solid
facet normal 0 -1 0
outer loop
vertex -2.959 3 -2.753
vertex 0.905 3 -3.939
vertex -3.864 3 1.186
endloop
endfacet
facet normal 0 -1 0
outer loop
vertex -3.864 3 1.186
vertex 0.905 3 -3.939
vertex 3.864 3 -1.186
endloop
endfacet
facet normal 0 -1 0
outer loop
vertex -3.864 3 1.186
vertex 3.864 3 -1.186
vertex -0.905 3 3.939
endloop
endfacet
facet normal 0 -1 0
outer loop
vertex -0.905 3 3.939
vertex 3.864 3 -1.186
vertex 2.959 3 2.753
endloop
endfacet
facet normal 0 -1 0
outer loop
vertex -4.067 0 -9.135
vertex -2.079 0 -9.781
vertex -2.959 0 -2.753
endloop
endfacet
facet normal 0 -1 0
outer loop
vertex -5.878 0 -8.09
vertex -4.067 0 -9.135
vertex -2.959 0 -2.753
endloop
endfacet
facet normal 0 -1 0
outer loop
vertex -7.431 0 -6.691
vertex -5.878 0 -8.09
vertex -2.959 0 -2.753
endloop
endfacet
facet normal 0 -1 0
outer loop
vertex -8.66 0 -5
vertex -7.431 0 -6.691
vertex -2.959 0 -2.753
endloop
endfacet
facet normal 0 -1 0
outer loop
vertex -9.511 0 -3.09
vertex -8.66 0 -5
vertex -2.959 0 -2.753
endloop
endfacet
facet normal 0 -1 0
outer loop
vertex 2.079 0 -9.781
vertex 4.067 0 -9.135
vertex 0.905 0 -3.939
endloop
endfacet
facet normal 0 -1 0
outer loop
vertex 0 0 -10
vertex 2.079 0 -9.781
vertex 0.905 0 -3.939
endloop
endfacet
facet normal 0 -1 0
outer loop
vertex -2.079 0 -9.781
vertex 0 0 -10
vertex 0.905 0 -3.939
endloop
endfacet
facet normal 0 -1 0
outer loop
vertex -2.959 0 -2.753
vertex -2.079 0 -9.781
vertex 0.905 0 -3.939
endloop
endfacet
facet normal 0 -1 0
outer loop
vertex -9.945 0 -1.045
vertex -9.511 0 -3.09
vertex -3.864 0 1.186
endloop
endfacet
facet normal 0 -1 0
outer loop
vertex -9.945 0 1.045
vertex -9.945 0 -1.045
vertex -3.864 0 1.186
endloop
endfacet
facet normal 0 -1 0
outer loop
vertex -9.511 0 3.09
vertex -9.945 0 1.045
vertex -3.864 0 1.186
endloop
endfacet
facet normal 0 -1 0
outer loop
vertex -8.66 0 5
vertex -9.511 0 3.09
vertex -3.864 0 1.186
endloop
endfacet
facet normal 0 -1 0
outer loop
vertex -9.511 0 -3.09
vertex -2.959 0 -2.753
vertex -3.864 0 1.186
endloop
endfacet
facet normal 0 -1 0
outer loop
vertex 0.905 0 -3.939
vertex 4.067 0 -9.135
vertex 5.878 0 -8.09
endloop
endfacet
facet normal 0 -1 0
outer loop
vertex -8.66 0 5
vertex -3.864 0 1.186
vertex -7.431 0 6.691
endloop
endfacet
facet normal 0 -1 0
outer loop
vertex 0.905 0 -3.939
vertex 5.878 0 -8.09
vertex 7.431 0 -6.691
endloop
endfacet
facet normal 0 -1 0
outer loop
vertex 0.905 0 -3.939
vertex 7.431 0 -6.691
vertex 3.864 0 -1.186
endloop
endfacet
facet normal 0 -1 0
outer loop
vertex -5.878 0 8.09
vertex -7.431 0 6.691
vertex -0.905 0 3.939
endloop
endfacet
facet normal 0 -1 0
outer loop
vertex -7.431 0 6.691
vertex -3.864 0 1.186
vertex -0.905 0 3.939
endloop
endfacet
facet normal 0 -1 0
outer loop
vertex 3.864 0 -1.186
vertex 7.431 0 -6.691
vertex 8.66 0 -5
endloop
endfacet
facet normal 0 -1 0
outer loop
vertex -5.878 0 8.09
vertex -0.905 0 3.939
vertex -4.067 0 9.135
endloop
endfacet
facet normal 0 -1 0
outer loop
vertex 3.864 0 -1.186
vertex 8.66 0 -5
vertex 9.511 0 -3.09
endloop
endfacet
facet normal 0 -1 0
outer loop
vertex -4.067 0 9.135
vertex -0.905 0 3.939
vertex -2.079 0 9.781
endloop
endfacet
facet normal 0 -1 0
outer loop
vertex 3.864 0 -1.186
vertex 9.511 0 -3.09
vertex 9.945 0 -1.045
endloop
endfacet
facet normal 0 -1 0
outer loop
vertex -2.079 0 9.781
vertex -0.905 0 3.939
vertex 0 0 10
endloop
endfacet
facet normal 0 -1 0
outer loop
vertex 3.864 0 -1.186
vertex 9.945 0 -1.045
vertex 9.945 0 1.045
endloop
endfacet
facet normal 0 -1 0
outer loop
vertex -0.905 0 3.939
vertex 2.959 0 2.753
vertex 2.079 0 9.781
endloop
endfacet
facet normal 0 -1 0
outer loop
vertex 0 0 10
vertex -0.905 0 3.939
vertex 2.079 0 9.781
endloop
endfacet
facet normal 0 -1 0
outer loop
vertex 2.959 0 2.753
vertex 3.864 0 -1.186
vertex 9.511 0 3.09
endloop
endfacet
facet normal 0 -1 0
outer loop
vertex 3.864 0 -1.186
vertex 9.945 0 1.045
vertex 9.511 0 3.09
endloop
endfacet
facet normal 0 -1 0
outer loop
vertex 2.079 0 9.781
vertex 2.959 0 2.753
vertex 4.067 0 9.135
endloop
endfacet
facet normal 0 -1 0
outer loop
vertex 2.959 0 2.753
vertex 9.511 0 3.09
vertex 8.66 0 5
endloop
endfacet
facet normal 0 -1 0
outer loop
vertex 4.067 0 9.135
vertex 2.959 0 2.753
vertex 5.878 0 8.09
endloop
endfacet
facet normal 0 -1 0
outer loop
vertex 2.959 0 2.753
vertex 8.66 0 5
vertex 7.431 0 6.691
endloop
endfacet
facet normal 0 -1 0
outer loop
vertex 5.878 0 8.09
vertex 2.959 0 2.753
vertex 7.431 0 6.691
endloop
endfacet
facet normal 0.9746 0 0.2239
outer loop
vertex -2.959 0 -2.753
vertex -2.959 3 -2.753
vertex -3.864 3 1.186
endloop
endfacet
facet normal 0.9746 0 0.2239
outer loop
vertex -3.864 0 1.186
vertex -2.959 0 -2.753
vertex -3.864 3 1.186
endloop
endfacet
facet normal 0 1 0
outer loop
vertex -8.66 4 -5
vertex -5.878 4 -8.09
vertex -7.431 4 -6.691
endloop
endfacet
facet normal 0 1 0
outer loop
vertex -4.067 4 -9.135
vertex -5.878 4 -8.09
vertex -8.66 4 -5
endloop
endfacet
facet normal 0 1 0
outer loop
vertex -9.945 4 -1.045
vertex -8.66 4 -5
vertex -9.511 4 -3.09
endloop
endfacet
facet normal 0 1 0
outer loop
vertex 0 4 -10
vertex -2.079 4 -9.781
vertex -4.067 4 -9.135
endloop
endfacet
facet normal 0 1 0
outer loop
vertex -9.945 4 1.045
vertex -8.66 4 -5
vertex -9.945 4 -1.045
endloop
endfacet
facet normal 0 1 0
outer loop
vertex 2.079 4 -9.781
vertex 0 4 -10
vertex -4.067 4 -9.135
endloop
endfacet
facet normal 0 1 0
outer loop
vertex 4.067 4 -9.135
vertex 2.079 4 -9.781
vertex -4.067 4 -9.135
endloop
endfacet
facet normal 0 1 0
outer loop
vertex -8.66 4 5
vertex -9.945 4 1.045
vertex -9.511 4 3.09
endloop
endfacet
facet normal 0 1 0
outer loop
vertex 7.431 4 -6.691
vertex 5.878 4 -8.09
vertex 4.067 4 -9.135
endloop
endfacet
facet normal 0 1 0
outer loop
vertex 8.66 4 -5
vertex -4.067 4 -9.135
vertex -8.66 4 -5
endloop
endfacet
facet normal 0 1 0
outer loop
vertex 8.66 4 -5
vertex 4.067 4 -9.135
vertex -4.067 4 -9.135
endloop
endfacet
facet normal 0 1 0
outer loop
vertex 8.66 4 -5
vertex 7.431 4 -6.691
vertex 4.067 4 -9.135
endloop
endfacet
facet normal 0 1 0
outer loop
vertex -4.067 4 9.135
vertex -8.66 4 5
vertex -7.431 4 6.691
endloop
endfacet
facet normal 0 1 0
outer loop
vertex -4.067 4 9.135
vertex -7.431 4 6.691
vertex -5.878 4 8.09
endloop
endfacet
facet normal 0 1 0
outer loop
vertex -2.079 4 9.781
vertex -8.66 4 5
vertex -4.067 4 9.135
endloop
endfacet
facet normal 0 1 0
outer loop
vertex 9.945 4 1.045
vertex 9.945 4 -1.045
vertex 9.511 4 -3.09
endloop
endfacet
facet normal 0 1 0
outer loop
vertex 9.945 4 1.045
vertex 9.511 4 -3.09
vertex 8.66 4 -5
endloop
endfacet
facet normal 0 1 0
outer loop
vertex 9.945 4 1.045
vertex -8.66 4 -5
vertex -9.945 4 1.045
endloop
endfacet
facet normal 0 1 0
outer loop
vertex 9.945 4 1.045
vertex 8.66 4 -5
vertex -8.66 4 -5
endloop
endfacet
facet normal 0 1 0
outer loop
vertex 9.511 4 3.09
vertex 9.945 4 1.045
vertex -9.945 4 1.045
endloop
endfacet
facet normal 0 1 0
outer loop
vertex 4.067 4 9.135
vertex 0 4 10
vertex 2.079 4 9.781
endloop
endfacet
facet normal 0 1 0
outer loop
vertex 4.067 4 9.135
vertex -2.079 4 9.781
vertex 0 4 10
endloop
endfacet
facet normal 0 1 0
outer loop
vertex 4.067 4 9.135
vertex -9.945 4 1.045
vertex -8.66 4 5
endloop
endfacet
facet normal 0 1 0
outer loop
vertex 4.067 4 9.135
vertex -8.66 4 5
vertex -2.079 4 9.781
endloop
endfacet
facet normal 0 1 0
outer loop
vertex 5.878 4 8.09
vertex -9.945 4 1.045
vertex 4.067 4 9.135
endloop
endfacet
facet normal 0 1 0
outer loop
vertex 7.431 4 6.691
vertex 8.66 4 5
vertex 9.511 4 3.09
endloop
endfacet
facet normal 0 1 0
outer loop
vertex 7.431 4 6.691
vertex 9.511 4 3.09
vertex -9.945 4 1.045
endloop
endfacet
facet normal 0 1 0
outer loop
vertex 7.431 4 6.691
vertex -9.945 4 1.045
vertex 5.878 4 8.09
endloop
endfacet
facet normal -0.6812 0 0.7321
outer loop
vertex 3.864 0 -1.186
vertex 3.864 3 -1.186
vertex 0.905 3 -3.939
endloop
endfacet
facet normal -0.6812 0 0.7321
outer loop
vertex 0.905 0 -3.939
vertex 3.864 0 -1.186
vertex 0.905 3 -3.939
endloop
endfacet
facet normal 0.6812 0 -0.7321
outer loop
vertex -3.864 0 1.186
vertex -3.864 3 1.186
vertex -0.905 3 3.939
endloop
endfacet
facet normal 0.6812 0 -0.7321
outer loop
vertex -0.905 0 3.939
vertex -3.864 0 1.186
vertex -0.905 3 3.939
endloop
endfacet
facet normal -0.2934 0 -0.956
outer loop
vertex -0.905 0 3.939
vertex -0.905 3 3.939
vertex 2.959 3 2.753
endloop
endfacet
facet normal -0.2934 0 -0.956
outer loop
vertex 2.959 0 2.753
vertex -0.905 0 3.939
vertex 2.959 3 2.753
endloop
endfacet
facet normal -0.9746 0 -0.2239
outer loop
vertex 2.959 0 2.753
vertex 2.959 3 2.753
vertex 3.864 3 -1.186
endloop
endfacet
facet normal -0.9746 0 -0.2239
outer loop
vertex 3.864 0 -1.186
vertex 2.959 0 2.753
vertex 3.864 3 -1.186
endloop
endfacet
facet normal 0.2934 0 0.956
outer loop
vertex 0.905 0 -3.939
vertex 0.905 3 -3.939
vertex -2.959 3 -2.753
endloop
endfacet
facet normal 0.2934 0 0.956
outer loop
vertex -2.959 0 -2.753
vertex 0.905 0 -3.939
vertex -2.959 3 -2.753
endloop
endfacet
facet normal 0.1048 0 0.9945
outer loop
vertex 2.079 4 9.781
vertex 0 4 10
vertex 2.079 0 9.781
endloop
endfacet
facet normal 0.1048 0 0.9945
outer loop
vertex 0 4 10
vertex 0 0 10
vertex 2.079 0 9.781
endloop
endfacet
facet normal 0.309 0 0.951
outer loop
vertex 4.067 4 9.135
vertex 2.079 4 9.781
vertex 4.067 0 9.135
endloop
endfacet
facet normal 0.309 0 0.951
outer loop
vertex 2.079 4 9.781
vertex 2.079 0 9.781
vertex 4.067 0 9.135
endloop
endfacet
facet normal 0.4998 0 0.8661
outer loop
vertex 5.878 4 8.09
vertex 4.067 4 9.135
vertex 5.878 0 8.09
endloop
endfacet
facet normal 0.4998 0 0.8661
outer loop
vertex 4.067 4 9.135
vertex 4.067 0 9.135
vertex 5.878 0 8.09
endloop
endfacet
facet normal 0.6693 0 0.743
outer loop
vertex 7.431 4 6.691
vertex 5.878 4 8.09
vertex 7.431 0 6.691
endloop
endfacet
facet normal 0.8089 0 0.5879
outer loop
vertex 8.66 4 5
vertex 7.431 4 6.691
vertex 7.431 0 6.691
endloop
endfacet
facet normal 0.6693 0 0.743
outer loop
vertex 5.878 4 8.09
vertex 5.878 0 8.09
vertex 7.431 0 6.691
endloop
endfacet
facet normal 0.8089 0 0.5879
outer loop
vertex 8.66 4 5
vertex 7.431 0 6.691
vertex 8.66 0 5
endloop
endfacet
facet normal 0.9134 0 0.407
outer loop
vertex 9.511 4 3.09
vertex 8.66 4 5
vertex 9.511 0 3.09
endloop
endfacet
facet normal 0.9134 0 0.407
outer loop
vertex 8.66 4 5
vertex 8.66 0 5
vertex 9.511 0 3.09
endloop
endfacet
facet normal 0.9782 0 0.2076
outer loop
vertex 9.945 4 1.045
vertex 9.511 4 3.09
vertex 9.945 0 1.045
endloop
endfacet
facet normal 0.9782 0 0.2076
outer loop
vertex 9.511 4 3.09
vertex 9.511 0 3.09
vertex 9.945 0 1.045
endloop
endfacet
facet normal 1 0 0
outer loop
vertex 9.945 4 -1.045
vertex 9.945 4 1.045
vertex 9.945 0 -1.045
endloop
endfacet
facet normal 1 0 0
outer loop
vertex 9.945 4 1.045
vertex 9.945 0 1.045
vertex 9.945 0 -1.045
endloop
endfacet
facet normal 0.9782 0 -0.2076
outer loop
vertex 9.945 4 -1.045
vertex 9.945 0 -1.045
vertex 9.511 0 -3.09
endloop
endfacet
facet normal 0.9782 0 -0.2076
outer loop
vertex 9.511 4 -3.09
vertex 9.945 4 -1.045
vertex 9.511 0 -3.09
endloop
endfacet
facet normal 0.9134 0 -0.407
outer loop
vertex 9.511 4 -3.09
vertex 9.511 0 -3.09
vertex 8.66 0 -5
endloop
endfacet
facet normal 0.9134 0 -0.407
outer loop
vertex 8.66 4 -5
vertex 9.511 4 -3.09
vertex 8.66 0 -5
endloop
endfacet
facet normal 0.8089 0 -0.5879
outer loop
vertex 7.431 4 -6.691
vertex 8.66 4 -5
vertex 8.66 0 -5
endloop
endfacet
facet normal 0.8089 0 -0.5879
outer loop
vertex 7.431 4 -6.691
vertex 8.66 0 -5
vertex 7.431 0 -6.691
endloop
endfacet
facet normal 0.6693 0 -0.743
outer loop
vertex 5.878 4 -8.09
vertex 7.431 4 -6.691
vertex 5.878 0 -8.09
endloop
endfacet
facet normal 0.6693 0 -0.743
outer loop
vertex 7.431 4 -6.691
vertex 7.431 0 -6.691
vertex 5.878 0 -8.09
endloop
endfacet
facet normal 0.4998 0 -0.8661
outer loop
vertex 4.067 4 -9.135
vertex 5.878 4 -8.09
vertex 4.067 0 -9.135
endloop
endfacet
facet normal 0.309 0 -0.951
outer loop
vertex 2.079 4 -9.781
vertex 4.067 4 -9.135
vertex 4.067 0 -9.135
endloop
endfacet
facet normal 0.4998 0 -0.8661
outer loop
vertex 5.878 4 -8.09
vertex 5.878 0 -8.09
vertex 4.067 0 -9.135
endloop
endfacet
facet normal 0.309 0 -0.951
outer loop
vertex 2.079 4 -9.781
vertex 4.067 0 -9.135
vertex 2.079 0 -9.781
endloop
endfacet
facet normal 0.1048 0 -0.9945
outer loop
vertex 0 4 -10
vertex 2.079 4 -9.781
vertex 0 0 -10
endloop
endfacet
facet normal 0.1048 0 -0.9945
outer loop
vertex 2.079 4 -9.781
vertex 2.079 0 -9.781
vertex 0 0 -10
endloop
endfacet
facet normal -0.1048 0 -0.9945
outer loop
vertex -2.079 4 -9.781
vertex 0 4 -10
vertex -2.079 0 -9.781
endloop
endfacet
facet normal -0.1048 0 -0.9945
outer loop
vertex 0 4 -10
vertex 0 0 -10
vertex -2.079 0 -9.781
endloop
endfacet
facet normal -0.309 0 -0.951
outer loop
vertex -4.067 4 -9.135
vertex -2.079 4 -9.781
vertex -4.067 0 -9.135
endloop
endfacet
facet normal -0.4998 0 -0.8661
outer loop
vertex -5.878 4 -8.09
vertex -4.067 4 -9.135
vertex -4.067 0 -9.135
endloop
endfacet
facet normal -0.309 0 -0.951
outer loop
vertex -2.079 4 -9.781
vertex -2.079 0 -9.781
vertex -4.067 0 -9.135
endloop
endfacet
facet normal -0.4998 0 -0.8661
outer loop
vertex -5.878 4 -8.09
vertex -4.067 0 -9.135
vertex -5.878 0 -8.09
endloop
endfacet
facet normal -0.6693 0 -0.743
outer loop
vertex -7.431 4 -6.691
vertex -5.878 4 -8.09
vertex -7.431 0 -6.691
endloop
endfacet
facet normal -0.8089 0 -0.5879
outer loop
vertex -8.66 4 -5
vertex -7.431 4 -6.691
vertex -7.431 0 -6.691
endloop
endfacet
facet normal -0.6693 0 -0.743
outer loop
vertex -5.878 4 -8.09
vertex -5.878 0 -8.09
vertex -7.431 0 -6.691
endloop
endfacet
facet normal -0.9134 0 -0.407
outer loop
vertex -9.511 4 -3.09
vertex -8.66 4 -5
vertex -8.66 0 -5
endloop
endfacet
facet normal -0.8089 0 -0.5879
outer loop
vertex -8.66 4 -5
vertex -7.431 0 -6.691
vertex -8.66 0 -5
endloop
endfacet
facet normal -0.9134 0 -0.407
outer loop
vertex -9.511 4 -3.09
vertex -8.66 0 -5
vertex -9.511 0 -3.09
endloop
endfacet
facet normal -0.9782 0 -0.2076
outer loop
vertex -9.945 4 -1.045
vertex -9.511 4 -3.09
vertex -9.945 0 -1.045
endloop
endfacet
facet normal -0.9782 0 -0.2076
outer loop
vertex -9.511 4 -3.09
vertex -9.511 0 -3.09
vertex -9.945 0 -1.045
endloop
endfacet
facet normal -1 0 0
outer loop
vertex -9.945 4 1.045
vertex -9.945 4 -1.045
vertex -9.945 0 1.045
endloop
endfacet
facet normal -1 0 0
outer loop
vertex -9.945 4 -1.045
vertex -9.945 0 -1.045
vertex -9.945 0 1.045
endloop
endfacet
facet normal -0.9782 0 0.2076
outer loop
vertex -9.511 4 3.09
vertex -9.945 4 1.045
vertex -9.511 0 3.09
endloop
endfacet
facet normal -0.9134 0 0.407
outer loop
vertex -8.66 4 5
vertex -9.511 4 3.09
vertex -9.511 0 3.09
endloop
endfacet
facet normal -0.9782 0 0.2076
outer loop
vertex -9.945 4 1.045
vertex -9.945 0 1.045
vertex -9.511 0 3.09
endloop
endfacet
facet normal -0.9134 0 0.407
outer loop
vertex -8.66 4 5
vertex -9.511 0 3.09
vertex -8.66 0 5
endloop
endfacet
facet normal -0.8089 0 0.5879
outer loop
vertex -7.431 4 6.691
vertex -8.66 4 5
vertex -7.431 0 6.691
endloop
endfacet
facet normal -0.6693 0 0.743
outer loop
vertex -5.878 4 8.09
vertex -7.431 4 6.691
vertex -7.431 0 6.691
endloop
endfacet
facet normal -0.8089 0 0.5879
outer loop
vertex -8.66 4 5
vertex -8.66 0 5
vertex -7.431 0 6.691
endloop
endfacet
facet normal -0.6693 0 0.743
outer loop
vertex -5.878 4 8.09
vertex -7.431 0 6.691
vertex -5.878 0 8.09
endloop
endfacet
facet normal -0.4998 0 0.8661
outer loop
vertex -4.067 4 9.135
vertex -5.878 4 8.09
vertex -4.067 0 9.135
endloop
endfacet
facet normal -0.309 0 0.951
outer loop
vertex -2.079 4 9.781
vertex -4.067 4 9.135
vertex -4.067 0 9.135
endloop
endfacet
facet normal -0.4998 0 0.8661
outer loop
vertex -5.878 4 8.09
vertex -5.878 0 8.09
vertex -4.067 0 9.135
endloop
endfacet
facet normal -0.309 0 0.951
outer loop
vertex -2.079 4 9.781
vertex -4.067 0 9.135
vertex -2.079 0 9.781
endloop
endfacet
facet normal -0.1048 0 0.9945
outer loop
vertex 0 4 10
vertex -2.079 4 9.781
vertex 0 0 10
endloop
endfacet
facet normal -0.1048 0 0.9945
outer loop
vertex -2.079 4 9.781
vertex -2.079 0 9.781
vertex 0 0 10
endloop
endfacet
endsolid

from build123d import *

# Parameters (mm, degrees)
SKETCH1_R           = 10
BOSS_EXTRUDE1_DEPTH = 3
CUT_EXTRUDE2_DEPTH  = 15.456832295
SKETCH3_R           = 10
BOSS_EXTRUDE2_DEPTH = 1


with BuildPart() as part:
    # Sketch1 → Boss-Extrude1 (new body)
    with BuildSketch(Plane(origin=(0, 0, 0), x_dir=(1, 0, 0), z_dir=(0, 1, 0))):
        with Locations(Location((0, 0, 0), (0, 0, 270))):
            Circle(SKETCH1_R)
    extrude(amount=BOSS_EXTRUDE1_DEPTH)

    # Sketch2 → Cut-Extrude2 (cut, through all)
    with BuildSketch(Plane(origin=(0, 3, 0), x_dir=(1, 0, 0), z_dir=(0, 1, 0))):
        Polygon((2.958730451, -2.753043307), (3.863570667, 1.18581408), (0.904840216, 3.938857387), (-2.958730451, 2.753043307), (-3.863570667, -1.18581408), (-0.904840216, -3.938857387), align=None)
    extrude(amount=-CUT_EXTRUDE2_DEPTH, mode=Mode.SUBTRACT)

    # Sketch3 → Boss-Extrude2 (add)
    with BuildSketch(Plane(origin=(0, 3, 0), x_dir=(1, 0, 0), z_dir=(0, 1, 0))):
        with Locations(Location((0, 0, 0), (0, 0, 270))):
            Circle(SKETCH3_R)
    extrude(amount=BOSS_EXTRUDE2_DEPTH)


solid = part.part
